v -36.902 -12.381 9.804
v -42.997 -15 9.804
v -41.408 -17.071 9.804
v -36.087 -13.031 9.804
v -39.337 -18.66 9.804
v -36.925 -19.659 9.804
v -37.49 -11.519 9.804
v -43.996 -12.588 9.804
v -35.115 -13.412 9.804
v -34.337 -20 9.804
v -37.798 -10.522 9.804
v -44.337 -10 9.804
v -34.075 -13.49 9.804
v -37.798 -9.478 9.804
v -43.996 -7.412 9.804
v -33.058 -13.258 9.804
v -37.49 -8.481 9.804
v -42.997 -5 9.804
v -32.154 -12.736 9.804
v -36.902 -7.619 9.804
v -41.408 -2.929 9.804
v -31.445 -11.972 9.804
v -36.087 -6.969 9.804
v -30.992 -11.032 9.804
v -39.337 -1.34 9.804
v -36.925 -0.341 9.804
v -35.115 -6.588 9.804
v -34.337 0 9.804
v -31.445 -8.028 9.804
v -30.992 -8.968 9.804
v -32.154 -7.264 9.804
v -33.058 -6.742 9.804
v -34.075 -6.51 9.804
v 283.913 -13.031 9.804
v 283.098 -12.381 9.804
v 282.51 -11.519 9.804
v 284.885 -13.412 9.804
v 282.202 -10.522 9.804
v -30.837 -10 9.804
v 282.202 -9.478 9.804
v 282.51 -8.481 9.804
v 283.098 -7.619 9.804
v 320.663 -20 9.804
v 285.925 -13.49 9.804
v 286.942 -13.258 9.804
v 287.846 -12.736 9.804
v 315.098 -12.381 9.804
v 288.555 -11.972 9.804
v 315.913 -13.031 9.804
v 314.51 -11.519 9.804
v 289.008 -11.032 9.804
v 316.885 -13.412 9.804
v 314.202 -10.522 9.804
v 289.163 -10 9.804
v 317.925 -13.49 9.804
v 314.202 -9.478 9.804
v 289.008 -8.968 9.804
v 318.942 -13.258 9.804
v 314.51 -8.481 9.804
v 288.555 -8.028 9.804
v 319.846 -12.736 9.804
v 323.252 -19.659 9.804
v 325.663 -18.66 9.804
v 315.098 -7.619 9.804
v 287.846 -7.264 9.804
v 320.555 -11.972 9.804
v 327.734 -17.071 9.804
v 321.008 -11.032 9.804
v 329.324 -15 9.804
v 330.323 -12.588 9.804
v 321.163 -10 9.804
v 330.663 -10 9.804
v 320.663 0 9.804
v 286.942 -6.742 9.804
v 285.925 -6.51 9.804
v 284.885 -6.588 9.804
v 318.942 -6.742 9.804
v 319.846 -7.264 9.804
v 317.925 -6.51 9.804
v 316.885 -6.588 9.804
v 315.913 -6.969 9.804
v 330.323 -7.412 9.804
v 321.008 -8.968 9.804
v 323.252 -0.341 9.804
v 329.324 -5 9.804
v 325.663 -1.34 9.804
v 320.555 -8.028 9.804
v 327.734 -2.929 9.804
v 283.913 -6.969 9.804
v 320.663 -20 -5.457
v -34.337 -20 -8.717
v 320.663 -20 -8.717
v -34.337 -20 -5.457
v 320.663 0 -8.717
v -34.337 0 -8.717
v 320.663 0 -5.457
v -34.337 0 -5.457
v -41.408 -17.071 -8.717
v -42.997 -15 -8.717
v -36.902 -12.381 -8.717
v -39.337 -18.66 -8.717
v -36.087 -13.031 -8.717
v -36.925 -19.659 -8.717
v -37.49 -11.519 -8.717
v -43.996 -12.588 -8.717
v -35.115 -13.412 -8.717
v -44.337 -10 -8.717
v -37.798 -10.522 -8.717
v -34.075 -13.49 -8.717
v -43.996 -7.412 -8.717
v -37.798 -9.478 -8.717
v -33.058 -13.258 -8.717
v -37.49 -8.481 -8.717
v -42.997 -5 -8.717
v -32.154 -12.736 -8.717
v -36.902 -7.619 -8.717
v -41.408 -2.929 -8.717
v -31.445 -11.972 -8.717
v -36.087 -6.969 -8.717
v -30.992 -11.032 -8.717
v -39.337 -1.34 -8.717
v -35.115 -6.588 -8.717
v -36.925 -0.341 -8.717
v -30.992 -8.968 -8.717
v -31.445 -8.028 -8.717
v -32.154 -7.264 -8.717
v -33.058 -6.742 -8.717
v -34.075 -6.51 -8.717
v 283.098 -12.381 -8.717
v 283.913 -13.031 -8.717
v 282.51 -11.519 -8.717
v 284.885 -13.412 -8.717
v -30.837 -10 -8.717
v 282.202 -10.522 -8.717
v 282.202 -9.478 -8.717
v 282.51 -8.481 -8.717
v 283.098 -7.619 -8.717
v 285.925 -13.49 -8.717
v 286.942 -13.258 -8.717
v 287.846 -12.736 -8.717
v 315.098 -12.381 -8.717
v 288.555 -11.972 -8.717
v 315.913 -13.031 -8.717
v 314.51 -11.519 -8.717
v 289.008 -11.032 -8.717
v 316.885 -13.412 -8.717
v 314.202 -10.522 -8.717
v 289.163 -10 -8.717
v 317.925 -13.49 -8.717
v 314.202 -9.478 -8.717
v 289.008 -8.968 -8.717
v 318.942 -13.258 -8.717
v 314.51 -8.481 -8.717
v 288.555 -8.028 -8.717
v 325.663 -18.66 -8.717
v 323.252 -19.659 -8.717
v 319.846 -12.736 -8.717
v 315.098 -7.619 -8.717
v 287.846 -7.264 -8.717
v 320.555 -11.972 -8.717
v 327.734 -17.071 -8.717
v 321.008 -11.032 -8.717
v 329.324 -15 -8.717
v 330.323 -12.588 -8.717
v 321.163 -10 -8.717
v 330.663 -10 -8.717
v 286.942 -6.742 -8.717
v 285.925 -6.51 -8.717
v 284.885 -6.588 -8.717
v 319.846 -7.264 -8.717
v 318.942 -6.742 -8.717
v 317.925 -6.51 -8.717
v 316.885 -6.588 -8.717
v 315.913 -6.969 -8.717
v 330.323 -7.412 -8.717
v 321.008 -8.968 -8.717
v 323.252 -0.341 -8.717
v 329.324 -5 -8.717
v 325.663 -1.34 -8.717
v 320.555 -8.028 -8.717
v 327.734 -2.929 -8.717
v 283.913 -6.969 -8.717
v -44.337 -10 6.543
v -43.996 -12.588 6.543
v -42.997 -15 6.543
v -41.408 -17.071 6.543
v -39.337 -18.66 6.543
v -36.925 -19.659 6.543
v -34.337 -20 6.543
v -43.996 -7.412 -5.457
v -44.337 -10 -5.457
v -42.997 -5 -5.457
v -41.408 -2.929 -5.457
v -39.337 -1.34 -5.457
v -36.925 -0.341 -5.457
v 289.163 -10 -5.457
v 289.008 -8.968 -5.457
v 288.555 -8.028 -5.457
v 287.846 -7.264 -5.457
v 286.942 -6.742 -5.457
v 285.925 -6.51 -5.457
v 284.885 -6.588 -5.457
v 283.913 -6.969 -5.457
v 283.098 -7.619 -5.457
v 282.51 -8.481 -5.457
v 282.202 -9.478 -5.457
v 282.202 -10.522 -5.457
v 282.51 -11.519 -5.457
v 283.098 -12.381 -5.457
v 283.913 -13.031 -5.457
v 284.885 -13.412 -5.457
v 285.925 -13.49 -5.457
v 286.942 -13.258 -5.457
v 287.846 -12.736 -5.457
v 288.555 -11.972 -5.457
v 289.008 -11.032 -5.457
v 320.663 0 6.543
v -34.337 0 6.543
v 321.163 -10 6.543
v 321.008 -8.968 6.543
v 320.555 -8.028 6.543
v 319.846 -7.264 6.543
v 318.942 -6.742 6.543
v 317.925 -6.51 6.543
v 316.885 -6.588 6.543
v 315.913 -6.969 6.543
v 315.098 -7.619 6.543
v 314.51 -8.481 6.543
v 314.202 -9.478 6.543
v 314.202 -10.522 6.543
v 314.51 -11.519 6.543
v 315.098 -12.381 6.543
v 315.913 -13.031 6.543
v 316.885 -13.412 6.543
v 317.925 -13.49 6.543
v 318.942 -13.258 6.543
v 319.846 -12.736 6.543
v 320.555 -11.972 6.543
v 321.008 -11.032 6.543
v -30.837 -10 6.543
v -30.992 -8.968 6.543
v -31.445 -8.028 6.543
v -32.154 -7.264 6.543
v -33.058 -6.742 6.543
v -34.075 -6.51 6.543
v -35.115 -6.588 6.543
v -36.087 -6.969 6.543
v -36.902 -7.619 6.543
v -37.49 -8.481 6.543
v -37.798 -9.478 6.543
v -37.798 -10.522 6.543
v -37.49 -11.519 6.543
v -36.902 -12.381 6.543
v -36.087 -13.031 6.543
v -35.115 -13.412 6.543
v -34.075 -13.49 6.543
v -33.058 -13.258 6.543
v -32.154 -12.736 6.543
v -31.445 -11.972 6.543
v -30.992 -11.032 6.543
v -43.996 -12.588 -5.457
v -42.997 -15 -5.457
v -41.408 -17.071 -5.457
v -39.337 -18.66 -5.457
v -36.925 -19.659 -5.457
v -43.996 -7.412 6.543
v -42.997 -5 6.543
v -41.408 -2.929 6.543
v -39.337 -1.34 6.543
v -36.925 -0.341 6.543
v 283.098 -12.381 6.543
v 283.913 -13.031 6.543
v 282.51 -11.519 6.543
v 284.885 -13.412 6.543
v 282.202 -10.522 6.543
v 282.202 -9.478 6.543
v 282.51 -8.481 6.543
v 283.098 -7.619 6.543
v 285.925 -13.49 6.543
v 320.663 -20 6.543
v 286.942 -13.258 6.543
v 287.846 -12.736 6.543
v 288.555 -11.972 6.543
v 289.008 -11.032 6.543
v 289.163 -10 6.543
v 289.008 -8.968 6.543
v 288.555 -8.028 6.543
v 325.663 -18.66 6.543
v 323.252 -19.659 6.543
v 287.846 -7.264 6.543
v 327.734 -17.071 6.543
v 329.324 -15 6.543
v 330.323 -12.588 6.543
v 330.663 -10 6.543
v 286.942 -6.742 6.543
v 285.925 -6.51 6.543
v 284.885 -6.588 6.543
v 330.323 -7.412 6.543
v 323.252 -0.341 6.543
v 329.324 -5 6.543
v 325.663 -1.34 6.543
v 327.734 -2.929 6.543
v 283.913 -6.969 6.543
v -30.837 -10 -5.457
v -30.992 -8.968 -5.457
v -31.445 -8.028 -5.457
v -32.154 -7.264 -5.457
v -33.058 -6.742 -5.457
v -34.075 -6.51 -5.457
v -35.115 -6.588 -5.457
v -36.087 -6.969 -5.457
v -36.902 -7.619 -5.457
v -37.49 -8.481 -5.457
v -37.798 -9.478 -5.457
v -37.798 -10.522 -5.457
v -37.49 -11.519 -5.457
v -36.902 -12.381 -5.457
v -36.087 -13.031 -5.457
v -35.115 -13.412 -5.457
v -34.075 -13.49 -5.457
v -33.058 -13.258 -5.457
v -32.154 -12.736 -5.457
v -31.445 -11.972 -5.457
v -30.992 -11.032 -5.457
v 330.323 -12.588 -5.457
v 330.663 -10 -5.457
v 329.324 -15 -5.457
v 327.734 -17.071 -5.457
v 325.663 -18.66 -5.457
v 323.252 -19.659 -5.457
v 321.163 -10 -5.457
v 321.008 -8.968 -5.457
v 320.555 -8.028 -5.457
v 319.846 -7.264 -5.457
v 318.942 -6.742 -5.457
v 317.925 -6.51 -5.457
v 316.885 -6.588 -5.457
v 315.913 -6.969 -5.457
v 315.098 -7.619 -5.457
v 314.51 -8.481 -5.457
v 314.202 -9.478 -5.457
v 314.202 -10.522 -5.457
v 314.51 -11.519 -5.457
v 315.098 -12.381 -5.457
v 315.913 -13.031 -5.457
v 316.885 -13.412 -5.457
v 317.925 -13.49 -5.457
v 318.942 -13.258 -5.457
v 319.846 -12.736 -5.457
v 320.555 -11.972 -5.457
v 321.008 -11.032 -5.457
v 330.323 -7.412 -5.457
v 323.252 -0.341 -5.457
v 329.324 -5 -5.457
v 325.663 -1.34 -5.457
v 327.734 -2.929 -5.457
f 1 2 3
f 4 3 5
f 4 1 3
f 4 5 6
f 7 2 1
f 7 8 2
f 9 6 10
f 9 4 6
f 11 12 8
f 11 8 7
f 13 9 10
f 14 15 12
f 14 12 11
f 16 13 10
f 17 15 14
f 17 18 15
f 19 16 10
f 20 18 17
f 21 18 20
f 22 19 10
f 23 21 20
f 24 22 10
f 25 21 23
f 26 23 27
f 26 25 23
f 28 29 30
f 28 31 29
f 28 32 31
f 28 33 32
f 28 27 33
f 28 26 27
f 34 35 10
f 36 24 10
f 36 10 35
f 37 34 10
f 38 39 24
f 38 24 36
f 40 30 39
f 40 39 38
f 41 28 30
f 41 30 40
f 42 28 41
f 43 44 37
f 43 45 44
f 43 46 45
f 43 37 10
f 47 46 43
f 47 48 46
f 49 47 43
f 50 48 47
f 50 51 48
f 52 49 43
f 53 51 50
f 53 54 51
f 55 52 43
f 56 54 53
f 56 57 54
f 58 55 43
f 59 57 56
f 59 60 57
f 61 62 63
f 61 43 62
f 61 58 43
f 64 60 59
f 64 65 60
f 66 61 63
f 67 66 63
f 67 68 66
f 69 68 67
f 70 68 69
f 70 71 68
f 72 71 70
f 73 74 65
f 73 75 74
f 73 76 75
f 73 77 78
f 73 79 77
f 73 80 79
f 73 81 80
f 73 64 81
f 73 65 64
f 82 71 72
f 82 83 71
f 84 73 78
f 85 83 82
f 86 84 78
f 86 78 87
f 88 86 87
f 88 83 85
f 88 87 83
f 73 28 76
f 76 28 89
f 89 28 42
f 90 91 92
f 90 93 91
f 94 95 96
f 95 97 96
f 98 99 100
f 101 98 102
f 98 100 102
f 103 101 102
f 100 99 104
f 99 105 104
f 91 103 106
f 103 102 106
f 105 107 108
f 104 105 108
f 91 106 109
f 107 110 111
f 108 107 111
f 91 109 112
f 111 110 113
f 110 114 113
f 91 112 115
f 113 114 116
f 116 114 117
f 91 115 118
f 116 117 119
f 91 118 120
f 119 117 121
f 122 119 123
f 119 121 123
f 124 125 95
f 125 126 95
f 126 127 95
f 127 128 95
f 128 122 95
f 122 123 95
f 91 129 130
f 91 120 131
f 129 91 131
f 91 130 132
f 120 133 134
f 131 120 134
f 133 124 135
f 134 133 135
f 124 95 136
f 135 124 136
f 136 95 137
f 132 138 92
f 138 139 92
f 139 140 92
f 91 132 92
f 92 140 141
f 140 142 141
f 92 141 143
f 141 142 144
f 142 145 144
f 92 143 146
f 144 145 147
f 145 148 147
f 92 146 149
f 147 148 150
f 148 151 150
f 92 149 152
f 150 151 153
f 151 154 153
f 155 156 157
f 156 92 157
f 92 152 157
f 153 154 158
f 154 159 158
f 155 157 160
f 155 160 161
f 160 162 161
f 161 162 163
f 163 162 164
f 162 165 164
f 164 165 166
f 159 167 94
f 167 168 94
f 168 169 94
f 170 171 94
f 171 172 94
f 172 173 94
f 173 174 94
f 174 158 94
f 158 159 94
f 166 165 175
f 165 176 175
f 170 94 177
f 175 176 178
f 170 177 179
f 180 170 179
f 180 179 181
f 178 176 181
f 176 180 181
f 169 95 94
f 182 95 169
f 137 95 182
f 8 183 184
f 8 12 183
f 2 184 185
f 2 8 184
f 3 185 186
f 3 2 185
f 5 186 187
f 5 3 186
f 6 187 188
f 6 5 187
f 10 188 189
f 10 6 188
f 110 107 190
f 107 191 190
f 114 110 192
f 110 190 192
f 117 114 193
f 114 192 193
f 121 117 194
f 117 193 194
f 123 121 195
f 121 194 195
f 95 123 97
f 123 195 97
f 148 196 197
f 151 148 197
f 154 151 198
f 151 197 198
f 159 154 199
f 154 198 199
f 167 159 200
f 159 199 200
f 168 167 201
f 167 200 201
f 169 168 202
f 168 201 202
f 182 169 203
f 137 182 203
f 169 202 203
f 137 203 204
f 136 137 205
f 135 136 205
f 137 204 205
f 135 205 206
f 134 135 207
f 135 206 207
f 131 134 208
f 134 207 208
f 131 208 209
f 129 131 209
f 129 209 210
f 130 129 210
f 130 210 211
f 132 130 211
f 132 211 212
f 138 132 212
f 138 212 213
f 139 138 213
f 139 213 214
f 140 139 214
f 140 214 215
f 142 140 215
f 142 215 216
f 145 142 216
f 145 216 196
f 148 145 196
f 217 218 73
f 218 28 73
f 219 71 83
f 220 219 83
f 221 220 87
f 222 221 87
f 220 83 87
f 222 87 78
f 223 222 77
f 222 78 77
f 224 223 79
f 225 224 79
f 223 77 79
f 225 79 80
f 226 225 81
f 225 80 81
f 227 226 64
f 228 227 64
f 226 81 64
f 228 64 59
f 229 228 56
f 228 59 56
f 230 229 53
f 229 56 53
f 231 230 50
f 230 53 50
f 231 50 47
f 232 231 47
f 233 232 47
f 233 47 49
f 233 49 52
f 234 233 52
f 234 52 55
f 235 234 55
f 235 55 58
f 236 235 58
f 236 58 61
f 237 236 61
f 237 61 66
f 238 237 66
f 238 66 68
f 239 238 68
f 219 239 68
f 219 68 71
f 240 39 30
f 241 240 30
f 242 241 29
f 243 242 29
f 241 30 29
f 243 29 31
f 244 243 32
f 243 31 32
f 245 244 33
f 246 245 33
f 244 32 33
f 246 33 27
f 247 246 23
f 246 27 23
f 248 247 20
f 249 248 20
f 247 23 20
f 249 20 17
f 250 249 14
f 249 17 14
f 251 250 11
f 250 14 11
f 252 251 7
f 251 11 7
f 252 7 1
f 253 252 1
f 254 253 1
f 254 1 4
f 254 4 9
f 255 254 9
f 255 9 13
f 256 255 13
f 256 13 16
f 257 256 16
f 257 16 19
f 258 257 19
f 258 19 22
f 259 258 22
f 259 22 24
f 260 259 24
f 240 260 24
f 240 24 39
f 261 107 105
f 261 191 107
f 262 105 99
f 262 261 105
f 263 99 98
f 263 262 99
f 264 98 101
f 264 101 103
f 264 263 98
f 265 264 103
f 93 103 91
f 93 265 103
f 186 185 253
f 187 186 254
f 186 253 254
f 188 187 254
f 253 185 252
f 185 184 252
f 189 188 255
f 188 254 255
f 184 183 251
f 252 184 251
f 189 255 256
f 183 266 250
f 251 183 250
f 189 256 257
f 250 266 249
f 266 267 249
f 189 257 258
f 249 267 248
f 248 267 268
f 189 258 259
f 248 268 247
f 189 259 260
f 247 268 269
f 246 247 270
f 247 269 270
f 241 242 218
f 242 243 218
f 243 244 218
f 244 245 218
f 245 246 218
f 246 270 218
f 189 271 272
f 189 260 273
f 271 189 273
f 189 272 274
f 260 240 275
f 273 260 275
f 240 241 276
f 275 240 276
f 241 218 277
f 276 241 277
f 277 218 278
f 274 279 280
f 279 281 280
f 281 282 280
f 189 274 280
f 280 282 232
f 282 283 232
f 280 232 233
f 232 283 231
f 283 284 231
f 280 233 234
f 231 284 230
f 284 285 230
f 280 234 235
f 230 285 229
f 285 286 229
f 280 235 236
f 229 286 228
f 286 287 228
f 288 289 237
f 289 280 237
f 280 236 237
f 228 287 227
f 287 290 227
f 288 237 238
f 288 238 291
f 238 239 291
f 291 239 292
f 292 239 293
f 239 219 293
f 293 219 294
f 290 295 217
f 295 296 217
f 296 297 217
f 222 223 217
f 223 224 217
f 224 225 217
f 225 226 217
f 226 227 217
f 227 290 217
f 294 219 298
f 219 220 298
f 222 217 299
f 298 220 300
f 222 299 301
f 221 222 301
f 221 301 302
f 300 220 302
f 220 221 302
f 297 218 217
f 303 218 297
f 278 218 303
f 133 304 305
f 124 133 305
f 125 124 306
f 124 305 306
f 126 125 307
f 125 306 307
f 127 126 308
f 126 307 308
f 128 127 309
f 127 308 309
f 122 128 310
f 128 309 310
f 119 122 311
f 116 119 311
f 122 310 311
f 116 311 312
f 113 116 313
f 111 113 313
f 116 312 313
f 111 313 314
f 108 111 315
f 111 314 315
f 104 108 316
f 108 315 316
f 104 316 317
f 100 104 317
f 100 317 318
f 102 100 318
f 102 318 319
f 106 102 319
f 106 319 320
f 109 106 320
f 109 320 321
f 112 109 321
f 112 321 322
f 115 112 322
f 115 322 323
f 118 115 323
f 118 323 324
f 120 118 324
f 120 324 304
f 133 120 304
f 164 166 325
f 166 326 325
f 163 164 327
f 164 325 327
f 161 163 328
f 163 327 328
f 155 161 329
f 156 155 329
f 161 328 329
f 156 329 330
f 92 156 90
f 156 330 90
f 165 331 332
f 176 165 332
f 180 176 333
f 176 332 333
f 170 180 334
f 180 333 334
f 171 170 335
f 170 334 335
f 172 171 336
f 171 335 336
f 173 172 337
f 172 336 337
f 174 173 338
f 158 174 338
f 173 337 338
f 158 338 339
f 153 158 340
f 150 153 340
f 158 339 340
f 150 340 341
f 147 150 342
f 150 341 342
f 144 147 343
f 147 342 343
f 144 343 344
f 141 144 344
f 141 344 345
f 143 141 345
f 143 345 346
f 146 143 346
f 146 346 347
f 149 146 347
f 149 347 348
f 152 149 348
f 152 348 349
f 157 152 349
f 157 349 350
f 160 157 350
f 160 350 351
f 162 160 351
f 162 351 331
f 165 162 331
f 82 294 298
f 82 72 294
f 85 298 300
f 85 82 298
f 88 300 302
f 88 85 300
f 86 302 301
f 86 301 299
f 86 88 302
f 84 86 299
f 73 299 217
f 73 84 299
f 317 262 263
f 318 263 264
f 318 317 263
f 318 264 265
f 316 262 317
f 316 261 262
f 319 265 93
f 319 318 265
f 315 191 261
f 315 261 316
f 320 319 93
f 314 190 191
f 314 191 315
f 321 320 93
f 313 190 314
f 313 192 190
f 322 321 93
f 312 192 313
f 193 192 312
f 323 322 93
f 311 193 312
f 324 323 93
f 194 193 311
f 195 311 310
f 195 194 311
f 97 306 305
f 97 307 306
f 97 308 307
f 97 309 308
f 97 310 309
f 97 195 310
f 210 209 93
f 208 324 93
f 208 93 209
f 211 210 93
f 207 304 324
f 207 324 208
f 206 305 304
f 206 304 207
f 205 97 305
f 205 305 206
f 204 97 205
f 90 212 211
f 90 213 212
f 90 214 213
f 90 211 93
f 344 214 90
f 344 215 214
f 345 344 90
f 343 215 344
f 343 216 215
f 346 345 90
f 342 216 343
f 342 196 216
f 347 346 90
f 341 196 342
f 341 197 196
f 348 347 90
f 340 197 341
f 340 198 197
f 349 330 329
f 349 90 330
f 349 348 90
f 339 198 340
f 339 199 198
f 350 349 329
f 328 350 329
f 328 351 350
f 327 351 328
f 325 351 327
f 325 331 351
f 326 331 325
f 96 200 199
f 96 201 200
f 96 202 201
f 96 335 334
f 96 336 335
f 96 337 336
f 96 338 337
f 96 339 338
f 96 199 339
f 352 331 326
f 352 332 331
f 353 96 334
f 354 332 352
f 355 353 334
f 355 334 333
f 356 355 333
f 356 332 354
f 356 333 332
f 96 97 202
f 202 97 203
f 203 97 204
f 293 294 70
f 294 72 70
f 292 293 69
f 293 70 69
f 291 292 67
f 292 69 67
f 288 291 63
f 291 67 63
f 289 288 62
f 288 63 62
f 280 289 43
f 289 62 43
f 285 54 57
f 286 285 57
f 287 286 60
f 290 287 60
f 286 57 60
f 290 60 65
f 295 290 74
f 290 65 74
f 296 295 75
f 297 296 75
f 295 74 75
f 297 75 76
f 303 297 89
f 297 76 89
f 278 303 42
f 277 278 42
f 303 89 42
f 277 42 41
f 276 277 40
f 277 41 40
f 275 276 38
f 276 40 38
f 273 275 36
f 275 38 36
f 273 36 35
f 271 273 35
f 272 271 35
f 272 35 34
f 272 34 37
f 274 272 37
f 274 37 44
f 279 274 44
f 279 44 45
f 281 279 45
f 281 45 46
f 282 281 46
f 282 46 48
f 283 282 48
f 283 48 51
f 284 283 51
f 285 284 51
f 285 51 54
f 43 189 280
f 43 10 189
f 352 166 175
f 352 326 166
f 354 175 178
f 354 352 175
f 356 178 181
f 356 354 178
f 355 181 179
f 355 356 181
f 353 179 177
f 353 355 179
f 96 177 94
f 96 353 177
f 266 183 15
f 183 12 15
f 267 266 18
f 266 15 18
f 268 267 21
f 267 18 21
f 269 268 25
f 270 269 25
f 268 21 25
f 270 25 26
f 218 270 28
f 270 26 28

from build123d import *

# Parameters (mm, degrees)
F0_W     = 375
F0_H     = 3.2608695652
F1_DEPTH = 20
F2_R     = 9.99999
F2_2_R   = 9.99999
F3_R     = 3.5
F4_DEPTH = 25


# Not quite as in the source:
# - a fillet or chamfer is up to 0.001 mm smaller than in the source, because OpenCascade refuses the exact size
# - a feature names something its author has since deleted; it is built from what else it names


with BuildPart() as f1:
    # F0 (on Front) → F1 (new body)
    with BuildSketch(Plane.XZ):
        with Locations((143.1633904347, -7.0869565217)):
            Rectangle(F0_W, F0_H)
    extrude(amount=F1_DEPTH)

    # F2#2 (radius 10 in the source; OpenCascade refuses exactly that, so slightly less here)
    f2_2_edges = [f1.edges().sort_by_distance(p)[0] for p in [
        (330.66339, -20, -7.086957),
        (330.66339, 0, -7.086957),
        (-44.33661, 0, -7.086957),
        (-44.33661, -20, -7.086957),
    ]]
    fillet(f2_2_edges, radius=F2_2_R)


with BuildPart() as f1b:
    # F0 (on Front) → F1, piece 2 (new body)
    with BuildSketch(Plane.XZ):
        with Locations((143.1633904347, 8.1739130435)):
            Rectangle(F0_W, F0_H)
    extrude(amount=F1_DEPTH)

    # F2 (radius 10 in the source; OpenCascade refuses exactly that, so slightly less here)
    f2_edges = [f1b.edges().sort_by_distance(p)[0] for p in [
        (330.66339, -20, 8.173913),
        (330.66339, 0, 8.173913),
        (-44.33661, 0, 8.173913),
        (-44.33661, -20, 8.173913),
    ]]
    fillet(f2_edges, radius=F2_R)


with BuildPart() as f4_tool:
    # F3 (on face) → F4 (new body)
    with BuildSketch(Plane.XY.offset(9.8043478261)):
        with Locations((317.6633904347, -10)):
            Circle(F3_R)
        with Locations((285.6633904347, -10)):
            Circle(F3_R)
        with Locations((-34.3366095653, -10)):
            Circle(F3_R)
    extrude(amount=-F4_DEPTH)


with BuildPart() as f1_1:
    add(f1.part)

    # F4: cut by f4_tool
    add(f4_tool.part, mode=Mode.SUBTRACT)


with BuildPart() as f1b_1:
    add(f1b.part)

    # F4: cut by f4_tool
    add(f4_tool.part, mode=Mode.SUBTRACT)


solid = Compound([f1_1.part, f1b_1.part])
